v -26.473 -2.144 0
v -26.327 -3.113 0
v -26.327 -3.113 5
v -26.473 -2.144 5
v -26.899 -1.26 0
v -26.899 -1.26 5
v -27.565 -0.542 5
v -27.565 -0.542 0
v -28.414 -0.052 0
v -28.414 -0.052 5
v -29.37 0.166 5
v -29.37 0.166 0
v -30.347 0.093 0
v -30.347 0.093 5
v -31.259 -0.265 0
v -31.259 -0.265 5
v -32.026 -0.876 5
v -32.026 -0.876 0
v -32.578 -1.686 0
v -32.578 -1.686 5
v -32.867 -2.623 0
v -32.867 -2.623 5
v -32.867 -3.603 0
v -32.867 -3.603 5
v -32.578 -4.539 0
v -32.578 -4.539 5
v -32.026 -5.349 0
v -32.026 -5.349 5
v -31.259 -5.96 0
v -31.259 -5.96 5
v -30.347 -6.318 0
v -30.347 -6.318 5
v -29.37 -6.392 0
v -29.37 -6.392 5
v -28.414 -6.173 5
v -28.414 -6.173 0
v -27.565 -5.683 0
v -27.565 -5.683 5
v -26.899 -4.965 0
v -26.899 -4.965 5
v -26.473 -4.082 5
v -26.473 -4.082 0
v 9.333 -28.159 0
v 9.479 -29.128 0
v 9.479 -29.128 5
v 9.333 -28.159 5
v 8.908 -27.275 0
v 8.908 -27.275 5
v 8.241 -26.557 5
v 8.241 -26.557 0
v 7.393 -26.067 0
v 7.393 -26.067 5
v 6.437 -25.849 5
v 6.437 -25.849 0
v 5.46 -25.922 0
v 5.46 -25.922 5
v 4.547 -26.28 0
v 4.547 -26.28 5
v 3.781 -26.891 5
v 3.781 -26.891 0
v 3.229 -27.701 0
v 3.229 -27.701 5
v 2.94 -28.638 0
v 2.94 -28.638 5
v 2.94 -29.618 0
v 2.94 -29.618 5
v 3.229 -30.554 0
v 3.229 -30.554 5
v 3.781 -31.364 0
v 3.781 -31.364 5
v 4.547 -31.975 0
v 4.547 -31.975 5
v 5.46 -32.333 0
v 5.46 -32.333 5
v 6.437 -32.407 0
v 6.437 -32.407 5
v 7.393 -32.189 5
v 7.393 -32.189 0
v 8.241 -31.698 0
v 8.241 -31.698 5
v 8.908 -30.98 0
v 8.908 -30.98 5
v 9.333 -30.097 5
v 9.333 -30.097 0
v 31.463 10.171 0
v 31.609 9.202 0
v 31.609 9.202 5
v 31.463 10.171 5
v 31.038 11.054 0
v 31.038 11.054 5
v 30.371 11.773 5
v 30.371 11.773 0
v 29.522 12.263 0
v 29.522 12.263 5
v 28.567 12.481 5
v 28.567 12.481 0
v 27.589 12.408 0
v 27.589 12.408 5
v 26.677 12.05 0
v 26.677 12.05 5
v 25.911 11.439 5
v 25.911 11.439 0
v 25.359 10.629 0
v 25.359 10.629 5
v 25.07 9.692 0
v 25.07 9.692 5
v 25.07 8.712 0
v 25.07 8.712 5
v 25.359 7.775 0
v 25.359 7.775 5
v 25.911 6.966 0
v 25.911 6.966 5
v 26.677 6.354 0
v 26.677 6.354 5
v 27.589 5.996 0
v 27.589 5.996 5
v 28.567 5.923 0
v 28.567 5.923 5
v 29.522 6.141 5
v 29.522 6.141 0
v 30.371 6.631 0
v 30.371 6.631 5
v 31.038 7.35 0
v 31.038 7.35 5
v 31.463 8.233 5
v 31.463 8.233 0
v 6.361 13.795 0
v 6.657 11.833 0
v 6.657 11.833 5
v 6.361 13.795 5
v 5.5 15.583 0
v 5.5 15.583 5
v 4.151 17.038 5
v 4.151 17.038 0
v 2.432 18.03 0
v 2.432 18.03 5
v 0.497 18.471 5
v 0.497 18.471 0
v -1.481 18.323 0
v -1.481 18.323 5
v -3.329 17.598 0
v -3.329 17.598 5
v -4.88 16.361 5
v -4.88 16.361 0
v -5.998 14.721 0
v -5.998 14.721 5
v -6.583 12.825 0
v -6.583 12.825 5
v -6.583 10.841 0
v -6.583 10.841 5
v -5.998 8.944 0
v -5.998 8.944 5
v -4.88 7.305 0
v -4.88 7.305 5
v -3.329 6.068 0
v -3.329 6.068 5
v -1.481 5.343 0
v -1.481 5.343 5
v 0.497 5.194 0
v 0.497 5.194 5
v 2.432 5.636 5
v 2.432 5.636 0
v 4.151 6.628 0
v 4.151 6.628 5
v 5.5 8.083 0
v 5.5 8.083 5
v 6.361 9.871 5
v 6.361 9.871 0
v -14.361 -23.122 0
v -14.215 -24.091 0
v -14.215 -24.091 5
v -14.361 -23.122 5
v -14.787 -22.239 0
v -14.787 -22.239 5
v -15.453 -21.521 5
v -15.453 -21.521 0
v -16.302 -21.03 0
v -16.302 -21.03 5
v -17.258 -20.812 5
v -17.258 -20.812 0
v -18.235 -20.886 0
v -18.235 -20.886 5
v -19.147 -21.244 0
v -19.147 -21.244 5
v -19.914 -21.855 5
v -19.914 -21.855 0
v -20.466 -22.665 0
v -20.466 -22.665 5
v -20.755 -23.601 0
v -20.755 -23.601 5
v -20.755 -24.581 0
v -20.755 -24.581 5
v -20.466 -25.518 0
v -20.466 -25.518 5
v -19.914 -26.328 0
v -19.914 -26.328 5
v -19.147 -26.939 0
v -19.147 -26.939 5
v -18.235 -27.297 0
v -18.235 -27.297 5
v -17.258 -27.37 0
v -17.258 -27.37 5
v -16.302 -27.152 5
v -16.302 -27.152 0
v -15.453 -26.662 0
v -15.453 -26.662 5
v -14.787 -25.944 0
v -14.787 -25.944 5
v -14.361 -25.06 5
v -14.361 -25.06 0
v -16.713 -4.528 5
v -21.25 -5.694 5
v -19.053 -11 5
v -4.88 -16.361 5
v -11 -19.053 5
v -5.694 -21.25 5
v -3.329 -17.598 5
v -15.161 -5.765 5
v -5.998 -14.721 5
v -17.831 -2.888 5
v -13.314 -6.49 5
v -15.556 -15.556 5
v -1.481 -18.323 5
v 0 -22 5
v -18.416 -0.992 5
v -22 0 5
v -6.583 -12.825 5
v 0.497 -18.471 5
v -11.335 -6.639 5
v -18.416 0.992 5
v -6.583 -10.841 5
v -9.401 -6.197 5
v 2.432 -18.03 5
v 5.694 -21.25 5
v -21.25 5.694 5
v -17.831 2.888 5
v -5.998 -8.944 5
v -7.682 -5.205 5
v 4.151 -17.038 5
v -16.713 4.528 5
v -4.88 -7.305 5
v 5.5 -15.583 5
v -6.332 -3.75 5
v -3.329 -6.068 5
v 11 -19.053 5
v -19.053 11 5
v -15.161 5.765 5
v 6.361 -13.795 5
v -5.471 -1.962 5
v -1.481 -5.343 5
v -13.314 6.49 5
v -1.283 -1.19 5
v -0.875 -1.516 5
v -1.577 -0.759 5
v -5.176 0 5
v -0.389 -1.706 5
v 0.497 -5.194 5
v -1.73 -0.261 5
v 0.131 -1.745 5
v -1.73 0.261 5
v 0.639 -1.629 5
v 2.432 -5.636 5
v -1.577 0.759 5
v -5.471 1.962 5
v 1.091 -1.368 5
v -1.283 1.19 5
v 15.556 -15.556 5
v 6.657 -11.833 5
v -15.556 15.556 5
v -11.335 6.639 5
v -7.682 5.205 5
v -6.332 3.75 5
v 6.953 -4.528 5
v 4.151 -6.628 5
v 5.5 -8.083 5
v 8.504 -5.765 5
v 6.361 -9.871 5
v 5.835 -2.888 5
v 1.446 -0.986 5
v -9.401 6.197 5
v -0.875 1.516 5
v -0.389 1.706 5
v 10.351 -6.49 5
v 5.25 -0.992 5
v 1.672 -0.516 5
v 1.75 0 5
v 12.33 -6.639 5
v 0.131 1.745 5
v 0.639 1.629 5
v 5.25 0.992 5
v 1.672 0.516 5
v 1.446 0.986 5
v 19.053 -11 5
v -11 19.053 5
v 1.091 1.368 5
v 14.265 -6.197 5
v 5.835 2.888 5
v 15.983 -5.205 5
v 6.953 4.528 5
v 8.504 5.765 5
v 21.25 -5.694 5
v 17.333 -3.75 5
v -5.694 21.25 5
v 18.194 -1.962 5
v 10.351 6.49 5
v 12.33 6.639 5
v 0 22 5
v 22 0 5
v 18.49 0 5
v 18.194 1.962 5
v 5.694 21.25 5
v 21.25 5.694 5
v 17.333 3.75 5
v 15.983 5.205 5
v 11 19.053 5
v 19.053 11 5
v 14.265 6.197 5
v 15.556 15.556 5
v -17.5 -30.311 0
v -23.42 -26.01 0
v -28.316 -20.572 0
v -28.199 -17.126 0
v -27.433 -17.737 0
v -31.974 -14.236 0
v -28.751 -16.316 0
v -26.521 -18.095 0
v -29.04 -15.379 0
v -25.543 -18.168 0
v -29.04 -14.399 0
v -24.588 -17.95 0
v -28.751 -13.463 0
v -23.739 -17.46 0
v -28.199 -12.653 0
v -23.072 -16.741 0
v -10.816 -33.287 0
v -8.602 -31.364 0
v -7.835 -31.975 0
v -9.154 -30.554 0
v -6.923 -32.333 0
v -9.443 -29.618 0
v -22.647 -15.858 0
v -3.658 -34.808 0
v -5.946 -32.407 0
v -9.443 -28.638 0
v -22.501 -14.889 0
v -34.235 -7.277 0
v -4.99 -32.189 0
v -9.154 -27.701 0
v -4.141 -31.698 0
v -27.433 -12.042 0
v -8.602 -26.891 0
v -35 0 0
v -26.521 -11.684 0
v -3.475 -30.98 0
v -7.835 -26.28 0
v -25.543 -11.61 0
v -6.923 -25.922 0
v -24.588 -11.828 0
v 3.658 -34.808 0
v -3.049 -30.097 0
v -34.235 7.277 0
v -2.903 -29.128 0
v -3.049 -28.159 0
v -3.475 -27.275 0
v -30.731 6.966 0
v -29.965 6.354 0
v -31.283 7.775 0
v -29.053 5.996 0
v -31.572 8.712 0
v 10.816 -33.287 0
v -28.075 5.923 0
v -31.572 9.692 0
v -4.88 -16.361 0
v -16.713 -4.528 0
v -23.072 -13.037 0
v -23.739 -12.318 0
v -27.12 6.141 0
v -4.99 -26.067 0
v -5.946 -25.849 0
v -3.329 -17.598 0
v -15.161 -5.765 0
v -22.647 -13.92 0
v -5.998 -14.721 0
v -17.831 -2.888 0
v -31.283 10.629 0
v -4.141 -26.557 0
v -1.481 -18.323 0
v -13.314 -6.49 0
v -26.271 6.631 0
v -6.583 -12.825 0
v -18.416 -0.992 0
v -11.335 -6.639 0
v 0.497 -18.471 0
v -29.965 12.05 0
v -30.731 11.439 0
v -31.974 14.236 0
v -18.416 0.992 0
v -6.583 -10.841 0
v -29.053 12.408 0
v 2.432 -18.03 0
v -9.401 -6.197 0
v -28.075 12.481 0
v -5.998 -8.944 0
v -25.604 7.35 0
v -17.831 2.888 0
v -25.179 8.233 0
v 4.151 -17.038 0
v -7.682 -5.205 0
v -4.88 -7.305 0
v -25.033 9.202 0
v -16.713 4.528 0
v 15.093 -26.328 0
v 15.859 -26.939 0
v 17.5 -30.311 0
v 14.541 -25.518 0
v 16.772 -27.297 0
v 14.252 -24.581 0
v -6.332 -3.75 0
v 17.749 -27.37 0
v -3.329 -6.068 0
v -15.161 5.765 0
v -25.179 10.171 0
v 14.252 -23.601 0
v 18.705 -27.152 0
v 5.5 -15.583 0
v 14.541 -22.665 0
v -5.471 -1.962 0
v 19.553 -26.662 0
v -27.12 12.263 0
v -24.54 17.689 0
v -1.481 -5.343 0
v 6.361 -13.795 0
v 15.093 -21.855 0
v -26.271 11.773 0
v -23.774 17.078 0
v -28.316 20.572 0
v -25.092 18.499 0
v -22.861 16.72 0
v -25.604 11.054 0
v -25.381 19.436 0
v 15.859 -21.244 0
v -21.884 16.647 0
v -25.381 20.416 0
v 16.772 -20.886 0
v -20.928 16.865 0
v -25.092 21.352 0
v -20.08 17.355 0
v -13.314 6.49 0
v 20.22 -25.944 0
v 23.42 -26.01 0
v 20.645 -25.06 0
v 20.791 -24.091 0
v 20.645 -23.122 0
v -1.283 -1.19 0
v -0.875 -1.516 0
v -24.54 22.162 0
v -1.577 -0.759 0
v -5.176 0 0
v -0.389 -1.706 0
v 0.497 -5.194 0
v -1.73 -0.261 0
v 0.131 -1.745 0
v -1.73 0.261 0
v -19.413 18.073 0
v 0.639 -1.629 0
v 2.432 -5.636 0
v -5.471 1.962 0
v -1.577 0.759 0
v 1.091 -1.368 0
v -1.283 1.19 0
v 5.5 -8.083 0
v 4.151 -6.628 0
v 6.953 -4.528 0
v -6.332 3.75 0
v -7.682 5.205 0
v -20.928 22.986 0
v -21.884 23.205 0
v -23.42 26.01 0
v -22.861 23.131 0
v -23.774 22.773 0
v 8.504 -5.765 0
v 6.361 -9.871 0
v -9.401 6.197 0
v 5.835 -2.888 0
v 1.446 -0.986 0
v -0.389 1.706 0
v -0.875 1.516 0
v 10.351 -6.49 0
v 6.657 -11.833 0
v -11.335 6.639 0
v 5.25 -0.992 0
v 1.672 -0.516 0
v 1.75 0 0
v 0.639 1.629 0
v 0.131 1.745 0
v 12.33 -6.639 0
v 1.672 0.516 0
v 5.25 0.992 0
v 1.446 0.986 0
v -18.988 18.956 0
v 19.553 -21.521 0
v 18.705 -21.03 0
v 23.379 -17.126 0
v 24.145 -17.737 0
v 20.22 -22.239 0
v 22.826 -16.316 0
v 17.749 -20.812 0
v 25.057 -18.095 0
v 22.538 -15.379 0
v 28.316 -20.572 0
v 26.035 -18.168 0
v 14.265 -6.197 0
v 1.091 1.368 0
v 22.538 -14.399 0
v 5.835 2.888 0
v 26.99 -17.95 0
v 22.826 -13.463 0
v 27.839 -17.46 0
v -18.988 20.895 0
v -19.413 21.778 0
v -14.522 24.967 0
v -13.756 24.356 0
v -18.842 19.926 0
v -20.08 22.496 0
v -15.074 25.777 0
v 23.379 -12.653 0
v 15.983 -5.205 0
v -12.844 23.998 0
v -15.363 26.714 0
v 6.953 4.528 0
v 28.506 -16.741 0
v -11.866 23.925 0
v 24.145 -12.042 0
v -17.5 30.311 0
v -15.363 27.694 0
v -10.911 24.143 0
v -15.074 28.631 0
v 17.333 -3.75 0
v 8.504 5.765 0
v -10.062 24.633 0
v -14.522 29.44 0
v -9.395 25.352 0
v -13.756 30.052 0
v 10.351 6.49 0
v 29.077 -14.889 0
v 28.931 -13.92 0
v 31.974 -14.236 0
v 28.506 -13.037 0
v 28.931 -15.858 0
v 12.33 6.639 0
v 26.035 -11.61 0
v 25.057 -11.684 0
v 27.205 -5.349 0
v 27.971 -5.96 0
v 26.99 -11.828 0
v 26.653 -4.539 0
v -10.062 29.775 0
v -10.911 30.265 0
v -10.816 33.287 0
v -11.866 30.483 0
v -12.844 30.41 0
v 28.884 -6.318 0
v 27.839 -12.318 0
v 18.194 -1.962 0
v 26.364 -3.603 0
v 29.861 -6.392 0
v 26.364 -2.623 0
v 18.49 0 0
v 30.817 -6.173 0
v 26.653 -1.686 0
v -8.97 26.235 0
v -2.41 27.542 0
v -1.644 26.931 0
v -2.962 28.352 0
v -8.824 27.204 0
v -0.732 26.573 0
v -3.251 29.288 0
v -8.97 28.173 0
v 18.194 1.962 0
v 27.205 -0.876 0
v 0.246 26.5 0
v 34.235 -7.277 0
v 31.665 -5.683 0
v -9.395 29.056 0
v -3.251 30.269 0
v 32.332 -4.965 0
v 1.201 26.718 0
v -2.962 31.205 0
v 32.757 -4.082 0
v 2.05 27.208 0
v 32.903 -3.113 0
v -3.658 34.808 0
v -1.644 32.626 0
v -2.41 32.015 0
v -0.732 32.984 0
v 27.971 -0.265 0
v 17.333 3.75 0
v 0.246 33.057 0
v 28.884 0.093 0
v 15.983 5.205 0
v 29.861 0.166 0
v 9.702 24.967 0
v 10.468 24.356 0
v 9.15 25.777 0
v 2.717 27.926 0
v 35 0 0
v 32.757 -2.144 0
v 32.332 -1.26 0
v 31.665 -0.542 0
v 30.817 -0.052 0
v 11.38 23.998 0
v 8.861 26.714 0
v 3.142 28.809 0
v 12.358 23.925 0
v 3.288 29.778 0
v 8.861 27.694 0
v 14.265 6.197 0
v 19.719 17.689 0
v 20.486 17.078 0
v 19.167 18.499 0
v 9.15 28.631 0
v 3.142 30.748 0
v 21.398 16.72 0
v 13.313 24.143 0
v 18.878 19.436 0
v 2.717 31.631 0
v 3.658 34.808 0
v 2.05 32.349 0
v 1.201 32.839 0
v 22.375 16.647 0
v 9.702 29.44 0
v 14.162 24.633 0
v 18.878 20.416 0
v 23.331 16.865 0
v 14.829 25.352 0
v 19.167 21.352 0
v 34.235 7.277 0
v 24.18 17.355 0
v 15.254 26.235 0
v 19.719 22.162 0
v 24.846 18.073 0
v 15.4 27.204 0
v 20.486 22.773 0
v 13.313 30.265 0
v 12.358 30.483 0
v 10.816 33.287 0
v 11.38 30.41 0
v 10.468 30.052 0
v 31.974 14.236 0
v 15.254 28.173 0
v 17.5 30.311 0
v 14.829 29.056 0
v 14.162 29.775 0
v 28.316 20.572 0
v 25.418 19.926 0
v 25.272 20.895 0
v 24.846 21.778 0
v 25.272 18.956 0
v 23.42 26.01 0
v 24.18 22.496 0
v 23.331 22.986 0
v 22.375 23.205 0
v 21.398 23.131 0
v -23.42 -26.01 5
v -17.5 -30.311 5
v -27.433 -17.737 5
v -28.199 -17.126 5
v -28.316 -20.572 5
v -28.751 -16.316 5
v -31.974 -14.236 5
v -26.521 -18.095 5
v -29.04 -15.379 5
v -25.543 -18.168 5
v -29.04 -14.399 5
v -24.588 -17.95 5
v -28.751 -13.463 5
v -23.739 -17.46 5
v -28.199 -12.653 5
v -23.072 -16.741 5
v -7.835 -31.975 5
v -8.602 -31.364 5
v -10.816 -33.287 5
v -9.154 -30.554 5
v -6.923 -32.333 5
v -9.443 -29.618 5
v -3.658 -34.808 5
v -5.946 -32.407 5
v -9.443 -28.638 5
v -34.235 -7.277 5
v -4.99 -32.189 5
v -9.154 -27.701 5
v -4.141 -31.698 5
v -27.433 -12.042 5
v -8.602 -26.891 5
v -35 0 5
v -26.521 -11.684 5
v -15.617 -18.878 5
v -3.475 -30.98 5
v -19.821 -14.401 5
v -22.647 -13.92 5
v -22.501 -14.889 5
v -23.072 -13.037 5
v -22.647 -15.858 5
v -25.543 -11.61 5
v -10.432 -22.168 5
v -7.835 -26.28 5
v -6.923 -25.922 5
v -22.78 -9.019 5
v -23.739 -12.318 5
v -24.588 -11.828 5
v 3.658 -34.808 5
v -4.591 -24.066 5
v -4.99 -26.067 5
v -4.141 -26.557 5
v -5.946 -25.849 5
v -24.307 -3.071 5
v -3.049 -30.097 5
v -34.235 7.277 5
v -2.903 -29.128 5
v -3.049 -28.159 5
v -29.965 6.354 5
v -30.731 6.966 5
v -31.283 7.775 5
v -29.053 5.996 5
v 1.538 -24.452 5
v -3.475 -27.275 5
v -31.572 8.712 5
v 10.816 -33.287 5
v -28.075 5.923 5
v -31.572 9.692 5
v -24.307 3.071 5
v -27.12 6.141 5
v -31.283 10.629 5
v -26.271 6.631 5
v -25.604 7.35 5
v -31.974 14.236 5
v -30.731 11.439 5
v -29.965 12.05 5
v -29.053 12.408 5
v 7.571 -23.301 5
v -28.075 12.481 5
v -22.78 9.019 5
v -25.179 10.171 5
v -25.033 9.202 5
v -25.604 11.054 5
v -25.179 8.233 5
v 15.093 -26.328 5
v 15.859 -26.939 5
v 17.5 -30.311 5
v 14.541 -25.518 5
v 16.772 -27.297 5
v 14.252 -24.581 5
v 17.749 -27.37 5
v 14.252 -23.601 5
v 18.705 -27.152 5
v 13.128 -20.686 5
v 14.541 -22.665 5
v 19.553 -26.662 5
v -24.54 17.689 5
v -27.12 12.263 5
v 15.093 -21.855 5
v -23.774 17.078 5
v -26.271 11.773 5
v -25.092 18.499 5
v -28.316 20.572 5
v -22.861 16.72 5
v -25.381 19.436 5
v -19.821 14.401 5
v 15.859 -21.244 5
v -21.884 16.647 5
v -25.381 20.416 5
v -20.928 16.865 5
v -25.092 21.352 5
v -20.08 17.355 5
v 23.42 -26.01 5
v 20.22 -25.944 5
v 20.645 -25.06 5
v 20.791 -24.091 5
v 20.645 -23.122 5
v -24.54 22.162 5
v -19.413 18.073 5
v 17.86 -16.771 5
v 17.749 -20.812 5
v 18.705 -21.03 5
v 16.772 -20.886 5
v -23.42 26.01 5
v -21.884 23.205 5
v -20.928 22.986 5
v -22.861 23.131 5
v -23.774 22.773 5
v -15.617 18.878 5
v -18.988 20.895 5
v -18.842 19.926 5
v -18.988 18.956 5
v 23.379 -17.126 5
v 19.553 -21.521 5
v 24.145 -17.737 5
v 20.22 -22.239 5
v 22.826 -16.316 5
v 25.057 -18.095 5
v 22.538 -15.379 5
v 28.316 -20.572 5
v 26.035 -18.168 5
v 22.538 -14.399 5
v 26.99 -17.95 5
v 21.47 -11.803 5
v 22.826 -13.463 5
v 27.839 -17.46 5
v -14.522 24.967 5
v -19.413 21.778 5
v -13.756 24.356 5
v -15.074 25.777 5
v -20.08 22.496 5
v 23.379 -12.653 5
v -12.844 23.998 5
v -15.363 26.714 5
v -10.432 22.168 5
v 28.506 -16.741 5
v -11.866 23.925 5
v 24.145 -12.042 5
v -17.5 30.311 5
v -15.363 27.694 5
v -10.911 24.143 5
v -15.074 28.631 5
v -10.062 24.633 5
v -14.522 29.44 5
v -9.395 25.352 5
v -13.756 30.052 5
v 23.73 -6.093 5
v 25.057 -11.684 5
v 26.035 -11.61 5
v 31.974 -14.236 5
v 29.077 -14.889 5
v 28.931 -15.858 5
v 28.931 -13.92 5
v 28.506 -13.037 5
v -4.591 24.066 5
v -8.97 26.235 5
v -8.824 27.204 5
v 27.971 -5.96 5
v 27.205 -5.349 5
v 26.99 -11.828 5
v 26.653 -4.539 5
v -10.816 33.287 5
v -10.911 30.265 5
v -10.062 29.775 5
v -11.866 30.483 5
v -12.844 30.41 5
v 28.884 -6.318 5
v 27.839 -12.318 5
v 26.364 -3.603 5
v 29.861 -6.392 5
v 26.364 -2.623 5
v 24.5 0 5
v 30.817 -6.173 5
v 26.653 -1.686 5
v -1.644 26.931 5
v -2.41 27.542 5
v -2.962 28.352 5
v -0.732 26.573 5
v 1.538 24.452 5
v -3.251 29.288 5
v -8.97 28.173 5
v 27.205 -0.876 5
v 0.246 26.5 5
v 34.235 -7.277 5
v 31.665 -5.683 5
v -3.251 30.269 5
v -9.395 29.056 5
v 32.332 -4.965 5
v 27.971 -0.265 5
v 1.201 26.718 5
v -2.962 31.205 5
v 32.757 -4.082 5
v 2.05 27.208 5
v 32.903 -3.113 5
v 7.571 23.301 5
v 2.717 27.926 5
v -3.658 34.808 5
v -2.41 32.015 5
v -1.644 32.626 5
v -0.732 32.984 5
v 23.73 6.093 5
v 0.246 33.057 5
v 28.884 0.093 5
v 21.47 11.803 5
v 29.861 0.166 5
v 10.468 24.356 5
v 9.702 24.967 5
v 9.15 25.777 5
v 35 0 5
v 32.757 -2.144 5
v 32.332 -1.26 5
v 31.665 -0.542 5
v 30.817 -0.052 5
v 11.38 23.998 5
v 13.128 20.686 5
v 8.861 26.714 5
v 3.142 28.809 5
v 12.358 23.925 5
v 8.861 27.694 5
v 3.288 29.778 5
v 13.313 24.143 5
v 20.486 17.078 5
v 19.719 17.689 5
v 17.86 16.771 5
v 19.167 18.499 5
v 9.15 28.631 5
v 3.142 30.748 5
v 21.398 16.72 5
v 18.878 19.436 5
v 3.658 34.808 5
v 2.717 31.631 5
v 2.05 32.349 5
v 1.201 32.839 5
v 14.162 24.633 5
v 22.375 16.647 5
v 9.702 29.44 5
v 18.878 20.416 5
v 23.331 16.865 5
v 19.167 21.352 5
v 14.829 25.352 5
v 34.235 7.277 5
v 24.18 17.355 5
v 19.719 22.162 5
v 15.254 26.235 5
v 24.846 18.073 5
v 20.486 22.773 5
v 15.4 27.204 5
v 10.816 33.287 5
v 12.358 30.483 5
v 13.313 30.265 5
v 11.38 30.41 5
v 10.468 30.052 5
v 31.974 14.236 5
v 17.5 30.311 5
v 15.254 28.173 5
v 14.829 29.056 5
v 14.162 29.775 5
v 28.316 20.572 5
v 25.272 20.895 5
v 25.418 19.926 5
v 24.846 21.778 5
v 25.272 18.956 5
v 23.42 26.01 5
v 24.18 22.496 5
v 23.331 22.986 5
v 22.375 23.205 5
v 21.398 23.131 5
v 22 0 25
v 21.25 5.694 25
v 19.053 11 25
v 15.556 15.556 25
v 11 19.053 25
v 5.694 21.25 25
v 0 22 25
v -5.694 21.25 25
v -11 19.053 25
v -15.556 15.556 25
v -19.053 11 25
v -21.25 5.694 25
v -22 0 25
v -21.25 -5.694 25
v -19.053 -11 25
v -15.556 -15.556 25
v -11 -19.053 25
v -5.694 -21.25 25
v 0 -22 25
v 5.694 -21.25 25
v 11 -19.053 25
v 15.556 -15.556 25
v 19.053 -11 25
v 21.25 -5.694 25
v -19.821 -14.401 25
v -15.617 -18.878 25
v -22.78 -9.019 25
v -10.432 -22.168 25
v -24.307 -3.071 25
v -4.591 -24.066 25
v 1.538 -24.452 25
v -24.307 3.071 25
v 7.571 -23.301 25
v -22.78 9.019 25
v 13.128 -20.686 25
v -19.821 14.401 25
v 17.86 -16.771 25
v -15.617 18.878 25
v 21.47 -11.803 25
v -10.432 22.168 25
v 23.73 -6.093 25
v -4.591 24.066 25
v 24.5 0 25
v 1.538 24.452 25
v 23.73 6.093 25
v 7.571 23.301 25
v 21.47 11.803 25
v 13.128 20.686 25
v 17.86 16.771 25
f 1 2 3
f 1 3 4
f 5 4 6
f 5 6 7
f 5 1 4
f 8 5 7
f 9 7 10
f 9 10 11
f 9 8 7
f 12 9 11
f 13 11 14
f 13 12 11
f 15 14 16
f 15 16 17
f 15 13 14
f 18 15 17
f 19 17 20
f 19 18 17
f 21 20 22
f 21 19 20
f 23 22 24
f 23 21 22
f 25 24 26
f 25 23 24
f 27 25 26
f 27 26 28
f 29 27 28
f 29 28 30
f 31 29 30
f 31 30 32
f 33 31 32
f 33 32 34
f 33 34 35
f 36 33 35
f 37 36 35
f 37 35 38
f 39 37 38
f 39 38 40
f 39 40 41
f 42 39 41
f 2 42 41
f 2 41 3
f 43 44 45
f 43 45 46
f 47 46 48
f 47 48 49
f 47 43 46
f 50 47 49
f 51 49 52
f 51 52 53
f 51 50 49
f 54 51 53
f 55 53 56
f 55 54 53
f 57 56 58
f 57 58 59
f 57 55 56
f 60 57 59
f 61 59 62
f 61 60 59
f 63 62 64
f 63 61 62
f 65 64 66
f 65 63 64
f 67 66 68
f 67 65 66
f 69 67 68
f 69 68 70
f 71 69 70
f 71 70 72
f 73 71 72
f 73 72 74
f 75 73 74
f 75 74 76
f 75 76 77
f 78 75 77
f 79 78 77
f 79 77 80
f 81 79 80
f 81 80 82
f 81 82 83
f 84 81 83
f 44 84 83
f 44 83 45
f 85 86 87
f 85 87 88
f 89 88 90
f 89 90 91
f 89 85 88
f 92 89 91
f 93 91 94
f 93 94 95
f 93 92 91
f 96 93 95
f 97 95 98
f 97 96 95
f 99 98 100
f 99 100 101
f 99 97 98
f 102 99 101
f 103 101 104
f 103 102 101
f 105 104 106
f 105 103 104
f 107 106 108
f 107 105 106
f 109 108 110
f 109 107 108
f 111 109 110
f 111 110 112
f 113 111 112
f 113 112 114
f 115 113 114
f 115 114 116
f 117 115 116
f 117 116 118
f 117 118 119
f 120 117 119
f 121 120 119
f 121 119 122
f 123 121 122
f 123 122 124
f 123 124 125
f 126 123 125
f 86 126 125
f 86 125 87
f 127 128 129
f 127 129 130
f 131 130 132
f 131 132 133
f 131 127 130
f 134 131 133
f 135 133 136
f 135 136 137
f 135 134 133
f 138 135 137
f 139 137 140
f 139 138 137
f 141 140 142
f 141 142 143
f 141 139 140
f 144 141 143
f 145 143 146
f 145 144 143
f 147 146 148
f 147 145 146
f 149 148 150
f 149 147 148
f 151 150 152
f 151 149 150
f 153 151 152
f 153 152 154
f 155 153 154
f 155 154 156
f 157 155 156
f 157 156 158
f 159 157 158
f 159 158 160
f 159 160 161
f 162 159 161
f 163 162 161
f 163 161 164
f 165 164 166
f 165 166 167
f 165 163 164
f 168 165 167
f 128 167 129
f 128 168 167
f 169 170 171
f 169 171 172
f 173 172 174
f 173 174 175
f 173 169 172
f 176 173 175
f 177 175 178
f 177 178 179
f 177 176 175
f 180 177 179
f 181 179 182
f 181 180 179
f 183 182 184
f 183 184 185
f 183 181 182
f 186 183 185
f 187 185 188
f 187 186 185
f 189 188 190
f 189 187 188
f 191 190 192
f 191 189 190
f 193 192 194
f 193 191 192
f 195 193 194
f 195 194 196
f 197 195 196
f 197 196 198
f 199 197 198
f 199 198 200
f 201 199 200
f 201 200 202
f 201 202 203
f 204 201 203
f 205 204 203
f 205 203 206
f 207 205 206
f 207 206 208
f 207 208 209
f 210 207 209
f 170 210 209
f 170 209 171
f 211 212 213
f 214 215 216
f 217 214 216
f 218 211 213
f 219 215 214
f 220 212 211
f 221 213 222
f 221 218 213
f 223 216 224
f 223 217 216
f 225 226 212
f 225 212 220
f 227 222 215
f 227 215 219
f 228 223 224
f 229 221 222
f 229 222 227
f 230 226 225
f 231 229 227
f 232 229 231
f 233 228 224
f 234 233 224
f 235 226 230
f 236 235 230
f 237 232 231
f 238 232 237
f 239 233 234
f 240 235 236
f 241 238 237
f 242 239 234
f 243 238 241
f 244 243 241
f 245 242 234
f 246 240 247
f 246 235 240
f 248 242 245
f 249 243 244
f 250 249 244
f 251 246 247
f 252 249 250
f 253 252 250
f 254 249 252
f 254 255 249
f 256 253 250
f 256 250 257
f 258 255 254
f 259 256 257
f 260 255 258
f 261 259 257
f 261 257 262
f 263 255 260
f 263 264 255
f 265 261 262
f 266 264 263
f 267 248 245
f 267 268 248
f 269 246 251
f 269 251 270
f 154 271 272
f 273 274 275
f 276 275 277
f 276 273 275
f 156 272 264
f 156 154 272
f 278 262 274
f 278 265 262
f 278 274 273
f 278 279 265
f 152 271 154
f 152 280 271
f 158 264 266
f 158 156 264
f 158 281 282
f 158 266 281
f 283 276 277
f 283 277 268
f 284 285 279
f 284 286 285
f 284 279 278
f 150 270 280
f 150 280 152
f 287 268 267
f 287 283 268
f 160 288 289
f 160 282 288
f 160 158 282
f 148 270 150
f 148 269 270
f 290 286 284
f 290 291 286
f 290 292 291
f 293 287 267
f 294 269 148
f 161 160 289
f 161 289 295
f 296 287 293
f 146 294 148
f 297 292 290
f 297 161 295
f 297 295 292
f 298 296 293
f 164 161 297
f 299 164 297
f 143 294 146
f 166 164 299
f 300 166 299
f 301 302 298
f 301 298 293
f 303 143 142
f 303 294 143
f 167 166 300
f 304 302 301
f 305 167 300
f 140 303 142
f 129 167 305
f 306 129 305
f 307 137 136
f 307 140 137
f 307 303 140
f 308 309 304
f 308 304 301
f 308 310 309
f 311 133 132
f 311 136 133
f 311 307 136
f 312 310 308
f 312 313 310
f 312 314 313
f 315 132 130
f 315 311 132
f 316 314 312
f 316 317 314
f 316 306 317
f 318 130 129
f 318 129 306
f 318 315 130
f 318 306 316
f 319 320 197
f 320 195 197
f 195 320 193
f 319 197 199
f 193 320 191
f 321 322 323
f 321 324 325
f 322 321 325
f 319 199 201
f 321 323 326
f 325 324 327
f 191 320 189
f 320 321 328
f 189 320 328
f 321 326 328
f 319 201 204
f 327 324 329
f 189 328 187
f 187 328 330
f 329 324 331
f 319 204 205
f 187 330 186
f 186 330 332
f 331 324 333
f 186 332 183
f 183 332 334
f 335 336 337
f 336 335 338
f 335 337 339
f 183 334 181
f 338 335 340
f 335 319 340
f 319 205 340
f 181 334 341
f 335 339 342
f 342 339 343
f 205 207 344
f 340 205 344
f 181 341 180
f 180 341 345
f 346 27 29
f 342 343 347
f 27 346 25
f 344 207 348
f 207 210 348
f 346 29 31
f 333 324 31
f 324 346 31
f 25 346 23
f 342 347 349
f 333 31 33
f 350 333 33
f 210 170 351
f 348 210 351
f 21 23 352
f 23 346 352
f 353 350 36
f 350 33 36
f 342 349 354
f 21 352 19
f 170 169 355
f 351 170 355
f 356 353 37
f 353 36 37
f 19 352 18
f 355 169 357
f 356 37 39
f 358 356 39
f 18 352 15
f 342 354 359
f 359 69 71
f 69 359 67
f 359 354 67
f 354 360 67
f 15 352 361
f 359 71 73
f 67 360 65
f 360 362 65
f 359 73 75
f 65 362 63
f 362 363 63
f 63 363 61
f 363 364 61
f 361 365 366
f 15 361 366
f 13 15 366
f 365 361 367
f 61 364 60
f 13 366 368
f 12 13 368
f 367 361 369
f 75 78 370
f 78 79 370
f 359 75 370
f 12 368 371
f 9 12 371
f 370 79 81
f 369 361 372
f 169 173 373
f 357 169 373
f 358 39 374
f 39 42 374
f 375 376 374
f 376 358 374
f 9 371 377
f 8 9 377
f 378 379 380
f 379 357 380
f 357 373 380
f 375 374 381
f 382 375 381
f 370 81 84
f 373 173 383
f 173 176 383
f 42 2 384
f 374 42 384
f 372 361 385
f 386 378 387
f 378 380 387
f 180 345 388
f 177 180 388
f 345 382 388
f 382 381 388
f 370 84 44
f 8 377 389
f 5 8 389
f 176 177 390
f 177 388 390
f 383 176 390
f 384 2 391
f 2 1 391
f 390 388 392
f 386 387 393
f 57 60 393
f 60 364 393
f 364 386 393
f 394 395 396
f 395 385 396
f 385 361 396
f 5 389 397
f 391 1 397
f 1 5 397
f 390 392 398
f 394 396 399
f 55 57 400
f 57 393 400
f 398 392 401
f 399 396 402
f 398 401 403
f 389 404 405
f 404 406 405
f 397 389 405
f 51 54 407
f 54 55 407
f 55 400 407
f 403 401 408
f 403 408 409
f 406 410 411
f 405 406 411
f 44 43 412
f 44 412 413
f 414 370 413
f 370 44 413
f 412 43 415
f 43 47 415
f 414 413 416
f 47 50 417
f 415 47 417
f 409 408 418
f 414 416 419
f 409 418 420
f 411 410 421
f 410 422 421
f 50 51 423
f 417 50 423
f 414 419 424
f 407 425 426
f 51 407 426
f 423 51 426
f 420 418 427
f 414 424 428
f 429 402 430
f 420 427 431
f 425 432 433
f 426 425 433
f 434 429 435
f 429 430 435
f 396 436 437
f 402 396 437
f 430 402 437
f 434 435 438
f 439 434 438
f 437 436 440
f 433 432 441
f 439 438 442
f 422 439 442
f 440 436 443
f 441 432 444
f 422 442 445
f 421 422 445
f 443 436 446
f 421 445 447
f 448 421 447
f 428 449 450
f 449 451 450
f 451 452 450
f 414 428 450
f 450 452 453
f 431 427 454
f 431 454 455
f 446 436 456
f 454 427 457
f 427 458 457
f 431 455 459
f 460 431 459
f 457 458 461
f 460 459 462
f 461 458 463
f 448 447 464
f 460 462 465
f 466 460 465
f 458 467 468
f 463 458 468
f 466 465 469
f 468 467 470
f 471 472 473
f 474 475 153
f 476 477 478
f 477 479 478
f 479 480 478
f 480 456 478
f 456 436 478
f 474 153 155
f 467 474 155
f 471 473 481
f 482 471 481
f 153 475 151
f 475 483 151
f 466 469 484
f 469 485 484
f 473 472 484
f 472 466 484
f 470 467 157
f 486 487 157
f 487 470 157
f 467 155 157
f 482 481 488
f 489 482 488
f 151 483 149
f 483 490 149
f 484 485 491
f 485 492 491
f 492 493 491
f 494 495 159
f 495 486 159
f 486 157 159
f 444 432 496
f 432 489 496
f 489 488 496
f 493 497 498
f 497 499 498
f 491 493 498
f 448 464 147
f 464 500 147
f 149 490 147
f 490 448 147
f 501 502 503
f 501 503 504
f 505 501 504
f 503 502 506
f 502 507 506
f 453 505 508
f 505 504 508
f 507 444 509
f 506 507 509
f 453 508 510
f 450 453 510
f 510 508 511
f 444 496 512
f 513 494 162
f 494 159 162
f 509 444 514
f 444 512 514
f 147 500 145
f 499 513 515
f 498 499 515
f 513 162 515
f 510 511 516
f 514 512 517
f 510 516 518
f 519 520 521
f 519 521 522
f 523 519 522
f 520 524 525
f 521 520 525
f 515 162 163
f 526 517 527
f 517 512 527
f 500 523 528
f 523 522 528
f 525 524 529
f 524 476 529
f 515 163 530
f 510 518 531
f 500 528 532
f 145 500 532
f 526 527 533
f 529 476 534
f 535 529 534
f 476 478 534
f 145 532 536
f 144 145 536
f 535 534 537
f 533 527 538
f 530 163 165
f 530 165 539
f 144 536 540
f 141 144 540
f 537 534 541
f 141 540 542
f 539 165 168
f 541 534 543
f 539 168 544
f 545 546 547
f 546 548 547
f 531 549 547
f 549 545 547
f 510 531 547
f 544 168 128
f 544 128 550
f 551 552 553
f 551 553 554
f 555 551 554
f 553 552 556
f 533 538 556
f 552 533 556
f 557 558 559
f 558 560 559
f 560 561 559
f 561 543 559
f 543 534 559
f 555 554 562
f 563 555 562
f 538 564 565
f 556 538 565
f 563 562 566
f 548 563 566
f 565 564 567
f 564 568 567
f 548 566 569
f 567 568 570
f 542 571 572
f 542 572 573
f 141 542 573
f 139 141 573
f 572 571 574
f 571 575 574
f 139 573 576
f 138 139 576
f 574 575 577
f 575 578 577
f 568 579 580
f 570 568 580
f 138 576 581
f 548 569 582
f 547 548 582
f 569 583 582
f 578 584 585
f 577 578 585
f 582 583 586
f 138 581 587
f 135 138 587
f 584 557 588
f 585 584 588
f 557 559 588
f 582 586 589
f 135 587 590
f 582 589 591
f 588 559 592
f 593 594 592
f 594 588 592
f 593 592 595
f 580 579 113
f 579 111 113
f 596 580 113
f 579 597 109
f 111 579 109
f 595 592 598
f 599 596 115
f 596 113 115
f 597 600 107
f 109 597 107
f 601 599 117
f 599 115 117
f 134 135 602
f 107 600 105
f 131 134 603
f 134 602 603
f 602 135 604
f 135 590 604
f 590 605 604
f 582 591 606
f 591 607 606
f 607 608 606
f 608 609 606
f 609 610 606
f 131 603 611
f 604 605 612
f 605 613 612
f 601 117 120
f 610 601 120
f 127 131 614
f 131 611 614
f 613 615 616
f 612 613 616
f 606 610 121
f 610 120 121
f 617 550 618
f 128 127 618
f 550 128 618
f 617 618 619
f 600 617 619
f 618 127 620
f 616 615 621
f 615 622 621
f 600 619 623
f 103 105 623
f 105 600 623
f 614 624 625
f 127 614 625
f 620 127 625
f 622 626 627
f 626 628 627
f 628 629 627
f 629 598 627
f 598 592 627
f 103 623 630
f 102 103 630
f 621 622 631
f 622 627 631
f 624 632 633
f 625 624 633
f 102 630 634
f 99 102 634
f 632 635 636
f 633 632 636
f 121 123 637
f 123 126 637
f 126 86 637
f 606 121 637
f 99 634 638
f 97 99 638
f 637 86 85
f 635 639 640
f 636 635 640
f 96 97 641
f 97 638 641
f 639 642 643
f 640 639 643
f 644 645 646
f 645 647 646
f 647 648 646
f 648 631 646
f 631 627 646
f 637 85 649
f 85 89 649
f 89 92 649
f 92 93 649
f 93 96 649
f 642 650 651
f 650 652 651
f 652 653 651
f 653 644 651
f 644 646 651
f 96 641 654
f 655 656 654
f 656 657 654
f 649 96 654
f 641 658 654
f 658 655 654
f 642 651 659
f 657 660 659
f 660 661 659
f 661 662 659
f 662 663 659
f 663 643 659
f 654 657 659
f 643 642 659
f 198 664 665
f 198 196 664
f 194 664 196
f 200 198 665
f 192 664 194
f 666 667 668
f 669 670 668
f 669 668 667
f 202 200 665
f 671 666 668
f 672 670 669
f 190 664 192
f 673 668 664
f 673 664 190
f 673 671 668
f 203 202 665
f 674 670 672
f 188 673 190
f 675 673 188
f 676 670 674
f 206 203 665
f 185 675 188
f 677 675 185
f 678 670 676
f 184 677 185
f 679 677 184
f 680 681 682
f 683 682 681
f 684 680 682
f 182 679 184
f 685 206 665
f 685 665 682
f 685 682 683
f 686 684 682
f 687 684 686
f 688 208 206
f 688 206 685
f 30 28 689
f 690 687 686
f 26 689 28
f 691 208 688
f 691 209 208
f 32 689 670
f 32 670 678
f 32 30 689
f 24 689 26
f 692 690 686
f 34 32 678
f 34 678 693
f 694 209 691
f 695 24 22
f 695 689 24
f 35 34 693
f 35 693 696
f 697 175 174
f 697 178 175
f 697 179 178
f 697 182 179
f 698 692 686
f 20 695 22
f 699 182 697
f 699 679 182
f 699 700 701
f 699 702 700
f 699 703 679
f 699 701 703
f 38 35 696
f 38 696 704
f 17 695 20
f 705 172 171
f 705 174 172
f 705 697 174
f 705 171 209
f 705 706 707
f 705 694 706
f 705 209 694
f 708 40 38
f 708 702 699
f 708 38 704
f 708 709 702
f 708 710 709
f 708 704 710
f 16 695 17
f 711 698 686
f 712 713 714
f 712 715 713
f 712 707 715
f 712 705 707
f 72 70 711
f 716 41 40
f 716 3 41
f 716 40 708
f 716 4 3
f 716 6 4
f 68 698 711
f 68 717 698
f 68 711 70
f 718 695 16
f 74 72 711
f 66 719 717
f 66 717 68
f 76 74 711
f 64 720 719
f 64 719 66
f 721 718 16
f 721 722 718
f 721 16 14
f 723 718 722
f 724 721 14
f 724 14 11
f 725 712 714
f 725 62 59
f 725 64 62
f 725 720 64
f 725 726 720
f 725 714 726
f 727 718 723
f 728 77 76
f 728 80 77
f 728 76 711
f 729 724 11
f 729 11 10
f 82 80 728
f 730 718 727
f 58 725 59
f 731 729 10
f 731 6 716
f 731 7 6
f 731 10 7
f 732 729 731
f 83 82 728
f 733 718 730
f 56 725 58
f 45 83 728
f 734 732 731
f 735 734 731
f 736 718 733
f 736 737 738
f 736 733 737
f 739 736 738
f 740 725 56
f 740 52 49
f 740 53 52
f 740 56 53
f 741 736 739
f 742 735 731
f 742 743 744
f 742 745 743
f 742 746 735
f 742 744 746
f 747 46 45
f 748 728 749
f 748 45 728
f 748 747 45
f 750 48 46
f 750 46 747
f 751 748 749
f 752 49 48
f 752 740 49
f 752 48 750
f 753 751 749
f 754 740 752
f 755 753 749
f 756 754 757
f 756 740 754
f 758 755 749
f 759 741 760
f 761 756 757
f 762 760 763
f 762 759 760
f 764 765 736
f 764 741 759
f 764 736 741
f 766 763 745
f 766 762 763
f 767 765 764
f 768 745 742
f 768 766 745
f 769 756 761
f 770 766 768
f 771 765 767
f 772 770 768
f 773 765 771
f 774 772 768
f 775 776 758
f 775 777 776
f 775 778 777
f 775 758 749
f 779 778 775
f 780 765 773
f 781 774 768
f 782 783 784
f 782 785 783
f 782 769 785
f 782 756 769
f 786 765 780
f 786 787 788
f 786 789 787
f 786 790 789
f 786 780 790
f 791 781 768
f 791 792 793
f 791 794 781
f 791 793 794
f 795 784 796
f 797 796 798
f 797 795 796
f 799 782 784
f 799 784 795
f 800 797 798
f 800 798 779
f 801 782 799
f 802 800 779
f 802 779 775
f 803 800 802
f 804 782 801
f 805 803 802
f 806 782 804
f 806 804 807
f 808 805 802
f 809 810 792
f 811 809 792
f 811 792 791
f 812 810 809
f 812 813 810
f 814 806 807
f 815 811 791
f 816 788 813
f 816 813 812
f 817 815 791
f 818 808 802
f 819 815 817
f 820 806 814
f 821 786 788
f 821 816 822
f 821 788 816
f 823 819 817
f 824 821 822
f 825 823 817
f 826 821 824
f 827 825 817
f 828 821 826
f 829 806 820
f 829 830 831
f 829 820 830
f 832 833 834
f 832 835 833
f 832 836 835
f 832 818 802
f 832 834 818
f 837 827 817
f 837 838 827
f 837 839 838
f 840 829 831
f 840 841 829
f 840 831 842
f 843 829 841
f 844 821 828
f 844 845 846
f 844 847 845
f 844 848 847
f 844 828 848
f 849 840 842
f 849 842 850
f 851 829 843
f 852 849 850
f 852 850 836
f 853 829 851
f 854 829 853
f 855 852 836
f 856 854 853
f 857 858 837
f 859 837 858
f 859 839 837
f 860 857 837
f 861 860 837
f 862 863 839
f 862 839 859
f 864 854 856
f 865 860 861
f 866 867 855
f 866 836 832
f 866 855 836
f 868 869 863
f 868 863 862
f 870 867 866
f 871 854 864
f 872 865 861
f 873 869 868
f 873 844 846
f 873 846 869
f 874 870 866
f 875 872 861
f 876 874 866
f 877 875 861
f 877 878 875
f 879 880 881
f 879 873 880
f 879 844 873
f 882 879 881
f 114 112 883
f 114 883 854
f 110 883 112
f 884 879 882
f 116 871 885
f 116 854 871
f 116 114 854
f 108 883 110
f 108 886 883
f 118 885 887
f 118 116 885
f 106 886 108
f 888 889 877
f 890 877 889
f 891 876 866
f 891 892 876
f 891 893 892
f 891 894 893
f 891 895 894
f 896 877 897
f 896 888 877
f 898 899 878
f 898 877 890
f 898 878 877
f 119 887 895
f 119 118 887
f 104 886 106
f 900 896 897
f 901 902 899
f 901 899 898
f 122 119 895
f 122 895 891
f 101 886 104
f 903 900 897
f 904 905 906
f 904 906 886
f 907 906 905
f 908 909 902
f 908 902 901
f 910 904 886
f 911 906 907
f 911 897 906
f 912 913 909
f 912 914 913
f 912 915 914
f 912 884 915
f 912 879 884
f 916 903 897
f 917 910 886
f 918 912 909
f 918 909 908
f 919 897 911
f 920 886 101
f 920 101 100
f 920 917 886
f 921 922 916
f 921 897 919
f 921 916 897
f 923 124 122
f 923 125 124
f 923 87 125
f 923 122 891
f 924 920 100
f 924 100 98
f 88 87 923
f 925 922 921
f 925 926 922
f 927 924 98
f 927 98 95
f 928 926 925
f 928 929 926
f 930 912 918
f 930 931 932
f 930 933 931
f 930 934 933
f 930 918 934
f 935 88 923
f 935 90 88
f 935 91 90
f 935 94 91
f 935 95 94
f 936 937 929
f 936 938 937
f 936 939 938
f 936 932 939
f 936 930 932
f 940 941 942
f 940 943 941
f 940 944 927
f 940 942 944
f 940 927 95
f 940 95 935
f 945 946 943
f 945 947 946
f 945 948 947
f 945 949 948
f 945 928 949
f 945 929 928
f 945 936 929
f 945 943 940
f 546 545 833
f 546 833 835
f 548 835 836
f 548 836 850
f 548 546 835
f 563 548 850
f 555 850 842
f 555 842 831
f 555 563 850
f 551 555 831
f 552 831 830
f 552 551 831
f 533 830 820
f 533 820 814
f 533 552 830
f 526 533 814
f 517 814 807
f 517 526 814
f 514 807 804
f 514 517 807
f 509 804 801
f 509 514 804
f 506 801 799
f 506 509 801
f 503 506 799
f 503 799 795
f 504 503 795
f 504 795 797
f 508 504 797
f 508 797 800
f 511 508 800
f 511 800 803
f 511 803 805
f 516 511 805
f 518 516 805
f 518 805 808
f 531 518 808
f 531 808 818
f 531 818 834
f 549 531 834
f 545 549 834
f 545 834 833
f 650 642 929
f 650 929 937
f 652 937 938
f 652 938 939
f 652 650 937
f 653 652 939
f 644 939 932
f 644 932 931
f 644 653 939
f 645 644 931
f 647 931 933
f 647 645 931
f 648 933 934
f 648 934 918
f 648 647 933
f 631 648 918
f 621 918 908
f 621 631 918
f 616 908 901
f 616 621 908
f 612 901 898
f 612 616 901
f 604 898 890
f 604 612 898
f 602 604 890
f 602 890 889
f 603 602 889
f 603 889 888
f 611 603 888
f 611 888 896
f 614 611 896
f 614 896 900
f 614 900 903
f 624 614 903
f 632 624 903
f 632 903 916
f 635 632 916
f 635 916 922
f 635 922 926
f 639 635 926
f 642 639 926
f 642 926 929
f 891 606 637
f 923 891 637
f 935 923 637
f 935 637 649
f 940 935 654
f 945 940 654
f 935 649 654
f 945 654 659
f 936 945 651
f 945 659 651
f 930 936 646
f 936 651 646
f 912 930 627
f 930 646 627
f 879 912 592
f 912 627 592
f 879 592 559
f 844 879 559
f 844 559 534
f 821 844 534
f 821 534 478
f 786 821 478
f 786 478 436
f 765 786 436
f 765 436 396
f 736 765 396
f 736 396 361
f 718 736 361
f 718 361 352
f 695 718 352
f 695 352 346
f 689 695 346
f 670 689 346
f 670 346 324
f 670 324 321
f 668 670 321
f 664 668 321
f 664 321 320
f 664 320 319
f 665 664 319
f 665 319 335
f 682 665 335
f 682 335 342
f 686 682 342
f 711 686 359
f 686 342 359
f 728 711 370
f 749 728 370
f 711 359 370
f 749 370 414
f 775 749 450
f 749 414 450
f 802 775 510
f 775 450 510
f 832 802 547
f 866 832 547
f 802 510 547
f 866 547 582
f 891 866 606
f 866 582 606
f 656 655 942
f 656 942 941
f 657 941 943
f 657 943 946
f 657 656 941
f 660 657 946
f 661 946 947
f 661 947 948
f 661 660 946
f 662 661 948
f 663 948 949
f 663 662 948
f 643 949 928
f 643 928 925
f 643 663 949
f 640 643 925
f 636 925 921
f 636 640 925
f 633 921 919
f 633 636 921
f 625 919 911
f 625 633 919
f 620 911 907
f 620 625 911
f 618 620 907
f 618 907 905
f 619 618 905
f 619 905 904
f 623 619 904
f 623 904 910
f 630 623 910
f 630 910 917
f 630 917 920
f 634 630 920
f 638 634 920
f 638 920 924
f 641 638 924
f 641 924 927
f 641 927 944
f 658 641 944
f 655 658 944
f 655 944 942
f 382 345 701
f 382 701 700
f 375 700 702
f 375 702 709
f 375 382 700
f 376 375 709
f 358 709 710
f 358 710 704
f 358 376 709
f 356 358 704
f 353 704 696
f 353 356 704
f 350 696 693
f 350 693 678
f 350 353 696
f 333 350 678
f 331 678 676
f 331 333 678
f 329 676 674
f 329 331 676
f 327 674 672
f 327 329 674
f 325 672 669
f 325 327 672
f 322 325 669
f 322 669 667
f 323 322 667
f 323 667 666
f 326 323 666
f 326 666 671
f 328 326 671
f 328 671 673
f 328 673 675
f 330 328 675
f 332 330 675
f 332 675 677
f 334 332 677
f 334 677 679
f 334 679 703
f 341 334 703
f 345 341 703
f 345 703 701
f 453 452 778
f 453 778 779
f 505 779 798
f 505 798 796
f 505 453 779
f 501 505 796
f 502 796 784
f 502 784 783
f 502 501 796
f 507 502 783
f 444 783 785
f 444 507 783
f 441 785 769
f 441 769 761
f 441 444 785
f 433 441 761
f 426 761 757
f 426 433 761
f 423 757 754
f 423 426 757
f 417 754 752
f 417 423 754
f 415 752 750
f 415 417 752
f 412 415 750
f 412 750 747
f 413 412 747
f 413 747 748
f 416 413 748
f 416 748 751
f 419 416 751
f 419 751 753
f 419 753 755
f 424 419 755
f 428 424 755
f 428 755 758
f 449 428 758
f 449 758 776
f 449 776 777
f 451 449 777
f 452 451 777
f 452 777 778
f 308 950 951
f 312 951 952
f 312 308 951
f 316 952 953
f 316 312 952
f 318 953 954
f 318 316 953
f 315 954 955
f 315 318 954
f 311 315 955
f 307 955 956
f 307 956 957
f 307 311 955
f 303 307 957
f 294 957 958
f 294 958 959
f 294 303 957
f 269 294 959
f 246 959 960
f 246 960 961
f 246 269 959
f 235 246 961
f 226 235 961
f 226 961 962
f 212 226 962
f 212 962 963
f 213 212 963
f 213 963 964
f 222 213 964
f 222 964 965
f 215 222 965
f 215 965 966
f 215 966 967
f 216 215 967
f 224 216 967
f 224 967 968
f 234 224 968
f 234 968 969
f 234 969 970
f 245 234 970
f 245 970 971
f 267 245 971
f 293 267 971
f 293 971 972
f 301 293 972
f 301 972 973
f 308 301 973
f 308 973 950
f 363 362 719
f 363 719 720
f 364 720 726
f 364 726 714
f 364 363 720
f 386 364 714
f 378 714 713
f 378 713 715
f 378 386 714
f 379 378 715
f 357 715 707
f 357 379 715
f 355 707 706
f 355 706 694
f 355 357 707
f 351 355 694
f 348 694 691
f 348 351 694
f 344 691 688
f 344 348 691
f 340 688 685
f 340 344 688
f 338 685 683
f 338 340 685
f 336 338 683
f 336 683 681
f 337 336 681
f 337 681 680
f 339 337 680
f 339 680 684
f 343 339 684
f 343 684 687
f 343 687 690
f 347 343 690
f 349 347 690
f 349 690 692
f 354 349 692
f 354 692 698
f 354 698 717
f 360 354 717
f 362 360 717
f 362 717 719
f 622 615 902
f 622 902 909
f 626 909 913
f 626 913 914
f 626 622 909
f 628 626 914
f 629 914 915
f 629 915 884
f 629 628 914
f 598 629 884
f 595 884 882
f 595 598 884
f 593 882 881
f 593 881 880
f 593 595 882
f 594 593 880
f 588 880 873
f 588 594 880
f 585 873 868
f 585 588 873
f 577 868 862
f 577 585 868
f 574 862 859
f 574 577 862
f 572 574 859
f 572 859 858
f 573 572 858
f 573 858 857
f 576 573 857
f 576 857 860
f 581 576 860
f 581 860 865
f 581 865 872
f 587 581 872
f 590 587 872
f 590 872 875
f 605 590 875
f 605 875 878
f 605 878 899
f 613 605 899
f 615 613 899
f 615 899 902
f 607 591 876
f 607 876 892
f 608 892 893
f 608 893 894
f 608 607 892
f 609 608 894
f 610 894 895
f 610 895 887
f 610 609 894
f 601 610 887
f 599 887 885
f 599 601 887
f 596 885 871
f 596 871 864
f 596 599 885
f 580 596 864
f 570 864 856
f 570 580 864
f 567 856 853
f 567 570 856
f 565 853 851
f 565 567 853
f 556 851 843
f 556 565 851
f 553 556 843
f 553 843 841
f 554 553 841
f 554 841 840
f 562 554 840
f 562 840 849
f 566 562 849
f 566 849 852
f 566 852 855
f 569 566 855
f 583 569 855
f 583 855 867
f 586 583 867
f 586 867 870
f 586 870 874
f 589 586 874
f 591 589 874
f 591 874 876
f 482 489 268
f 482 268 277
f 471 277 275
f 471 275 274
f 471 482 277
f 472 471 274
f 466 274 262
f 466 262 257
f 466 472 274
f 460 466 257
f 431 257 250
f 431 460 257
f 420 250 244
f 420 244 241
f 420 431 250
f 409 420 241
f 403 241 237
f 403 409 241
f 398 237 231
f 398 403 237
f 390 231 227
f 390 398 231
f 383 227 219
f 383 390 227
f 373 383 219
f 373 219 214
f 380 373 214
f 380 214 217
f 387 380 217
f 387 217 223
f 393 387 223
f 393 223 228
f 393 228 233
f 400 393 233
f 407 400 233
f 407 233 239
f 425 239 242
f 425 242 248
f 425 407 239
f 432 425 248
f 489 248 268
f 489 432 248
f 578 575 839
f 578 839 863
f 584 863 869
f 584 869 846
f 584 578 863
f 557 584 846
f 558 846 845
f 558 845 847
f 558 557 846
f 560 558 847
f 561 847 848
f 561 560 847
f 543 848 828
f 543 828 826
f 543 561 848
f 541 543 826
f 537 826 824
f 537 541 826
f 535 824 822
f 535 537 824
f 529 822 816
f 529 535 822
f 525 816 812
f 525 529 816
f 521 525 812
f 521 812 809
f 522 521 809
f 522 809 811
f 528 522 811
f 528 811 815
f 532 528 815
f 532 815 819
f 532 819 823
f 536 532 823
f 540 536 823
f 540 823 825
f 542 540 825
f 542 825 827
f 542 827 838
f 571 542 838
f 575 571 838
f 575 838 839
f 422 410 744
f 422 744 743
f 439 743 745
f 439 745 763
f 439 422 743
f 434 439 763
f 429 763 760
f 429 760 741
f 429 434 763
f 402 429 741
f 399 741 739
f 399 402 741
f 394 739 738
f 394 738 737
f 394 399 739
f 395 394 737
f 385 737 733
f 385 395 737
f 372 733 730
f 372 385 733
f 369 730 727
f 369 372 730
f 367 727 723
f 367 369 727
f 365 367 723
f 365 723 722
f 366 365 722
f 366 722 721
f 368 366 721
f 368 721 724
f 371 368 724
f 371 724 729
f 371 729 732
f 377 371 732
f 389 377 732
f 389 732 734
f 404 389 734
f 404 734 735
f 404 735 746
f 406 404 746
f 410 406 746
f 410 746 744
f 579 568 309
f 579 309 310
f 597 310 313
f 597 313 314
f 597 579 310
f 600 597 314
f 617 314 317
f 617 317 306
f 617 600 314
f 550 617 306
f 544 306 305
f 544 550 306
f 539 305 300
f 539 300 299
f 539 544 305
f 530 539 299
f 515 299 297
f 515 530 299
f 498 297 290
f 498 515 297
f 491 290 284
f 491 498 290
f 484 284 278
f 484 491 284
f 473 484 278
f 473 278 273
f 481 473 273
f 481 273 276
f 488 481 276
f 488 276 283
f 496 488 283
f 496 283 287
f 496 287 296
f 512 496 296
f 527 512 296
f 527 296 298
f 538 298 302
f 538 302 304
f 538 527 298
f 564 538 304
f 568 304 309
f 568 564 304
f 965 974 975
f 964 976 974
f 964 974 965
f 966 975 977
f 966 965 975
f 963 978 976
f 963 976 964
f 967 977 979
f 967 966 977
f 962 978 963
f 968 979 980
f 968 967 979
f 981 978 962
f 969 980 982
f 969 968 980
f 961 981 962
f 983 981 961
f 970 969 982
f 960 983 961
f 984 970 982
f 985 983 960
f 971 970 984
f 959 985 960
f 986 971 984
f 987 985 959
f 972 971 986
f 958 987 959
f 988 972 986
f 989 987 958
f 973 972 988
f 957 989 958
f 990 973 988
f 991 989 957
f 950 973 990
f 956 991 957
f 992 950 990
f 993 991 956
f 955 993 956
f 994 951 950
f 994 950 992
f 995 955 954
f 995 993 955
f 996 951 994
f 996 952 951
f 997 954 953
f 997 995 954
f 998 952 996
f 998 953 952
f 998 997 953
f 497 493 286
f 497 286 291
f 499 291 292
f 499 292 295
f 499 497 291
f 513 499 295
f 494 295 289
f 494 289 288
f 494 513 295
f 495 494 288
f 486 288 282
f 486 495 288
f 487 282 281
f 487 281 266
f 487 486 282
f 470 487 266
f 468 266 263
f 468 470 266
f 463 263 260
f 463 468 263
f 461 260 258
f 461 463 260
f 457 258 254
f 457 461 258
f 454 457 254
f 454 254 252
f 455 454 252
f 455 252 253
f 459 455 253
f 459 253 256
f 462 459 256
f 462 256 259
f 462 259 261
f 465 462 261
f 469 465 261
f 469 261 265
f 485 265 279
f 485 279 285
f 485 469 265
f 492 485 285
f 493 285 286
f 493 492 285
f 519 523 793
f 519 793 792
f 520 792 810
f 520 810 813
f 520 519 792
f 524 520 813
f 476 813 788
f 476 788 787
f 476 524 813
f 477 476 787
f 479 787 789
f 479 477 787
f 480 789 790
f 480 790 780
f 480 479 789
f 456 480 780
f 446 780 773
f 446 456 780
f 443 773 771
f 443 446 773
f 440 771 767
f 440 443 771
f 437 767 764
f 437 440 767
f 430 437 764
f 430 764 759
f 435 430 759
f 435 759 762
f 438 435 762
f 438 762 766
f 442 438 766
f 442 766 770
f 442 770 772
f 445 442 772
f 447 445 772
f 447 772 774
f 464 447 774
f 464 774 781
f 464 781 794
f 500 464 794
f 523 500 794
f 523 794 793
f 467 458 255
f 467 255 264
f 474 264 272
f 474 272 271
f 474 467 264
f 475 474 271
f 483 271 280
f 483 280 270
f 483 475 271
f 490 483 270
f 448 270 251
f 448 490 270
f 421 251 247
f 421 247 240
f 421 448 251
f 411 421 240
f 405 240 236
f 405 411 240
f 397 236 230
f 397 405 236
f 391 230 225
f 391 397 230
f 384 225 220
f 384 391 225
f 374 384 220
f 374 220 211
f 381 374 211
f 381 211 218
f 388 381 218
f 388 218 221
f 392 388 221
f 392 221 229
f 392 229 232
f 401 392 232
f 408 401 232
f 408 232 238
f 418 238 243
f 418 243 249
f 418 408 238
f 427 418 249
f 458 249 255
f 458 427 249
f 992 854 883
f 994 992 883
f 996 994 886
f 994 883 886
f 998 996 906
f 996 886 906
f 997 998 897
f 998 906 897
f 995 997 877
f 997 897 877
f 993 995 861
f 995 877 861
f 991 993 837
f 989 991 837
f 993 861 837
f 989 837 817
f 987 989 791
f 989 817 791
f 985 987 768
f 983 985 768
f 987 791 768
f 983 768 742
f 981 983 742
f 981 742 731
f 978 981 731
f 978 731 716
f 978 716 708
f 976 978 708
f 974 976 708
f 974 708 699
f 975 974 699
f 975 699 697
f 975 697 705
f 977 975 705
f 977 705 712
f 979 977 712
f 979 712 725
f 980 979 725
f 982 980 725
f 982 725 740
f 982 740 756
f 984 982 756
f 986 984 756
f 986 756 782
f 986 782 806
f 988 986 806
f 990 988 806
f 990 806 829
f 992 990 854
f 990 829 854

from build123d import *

# Parameters (mm, degrees)
F0_R     = 35
F0_R_2   = 3.2880949383
F0_R_3   = 24.5
F0_R_4   = 22
F0_R_5   = 6.6571375288
F0_R_6   = 1.75
F1_DEPTH = 5
F2_DEPTH = 25
F3_DEPTH = 3


with BuildPart() as f1:
    # F0 (on Top) → F1 (new body)
    with BuildSketch(Plane.XY):
        Circle(F0_R)
        with Locations((-17.5033363634, -24.0912757185)):
            Circle(F0_R_2, mode=Mode.SUBTRACT)
        with Locations((-6.1912888152, -29.1277237765)):
            Circle(F0_R_2, mode=Mode.SUBTRACT)
        with Locations((-25.7888980415, -14.8892272264)):
            Circle(F0_R_2, mode=Mode.SUBTRACT)
        with Locations((-29.6153249635, -3.1126960824)):
            Circle(F0_R_2, mode=Mode.SUBTRACT)
        with Locations((6.1912888152, -29.1277237765)):
            Circle(F0_R_2, mode=Mode.SUBTRACT)
        with Locations((17.5033363634, -24.0912757185)):
            Circle(F0_R_2, mode=Mode.SUBTRACT)
        with Locations((25.7888980415, -14.8892272264)):
            Circle(F0_R_2, mode=Mode.SUBTRACT)
        with Locations((29.6153249635, -3.1126960824)):
            Circle(F0_R_2, mode=Mode.SUBTRACT)
        with Locations((-28.3209931525, 9.2020484921)):
            Circle(F0_R_2, mode=Mode.SUBTRACT)
        with Locations((-22.1297043373, 19.9256752844)):
            Circle(F0_R_2, mode=Mode.SUBTRACT)
        with Locations((-12.1119886001, 27.2039718009)):
            Circle(F0_R_2, mode=Mode.SUBTRACT)
        Circle(F0_R_3, mode=Mode.SUBTRACT)
        with Locations((28.3209931525, 9.2020484921)):
            Circle(F0_R_2, mode=Mode.SUBTRACT)
        with Locations((0, 29.7784544528)):
            Circle(F0_R_2, mode=Mode.SUBTRACT)
        with Locations((12.1119886001, 27.2039718009)):
            Circle(F0_R_2, mode=Mode.SUBTRACT)
        with Locations((22.1297043373, 19.9256752844)):
            Circle(F0_R_2, mode=Mode.SUBTRACT)
        Circle(F0_R_3)
        Circle(F0_R_4, mode=Mode.SUBTRACT)
        Circle(F0_R_4)
        with Locations((0, -11.8328090757)):
            Circle(F0_R_5, mode=Mode.SUBTRACT)
        with Locations((-11.8328090757, 0)):
            Circle(F0_R_5, mode=Mode.SUBTRACT)
        Circle(F0_R_6, mode=Mode.SUBTRACT)
        with Locations((11.8328090757, 0)):
            Circle(F0_R_5, mode=Mode.SUBTRACT)
        with Locations((0, 11.8328090757)):
            Circle(F0_R_5, mode=Mode.SUBTRACT)
    extrude(amount=F1_DEPTH)

    # F0 (on Top) → F2 (join)
    with BuildSketch(Plane.XY):
        Circle(F0_R_3)
        Circle(F0_R_4, mode=Mode.SUBTRACT)
    extrude(amount=F2_DEPTH)

    # F0 (on Top) → F3 (join)
    with BuildSketch(Plane.XY):
        Circle(F0_R)
        with Locations((-17.5033363634, -24.0912757185)):
            Circle(F0_R_2, mode=Mode.SUBTRACT)
        with Locations((-6.1912888152, -29.1277237765)):
            Circle(F0_R_2, mode=Mode.SUBTRACT)
        with Locations((-25.7888980415, -14.8892272264)):
            Circle(F0_R_2, mode=Mode.SUBTRACT)
        with Locations((-29.6153249635, -3.1126960824)):
            Circle(F0_R_2, mode=Mode.SUBTRACT)
        with Locations((6.1912888152, -29.1277237765)):
            Circle(F0_R_2, mode=Mode.SUBTRACT)
        with Locations((17.5033363634, -24.0912757185)):
            Circle(F0_R_2, mode=Mode.SUBTRACT)
        with Locations((25.7888980415, -14.8892272264)):
            Circle(F0_R_2, mode=Mode.SUBTRACT)
        with Locations((29.6153249635, -3.1126960824)):
            Circle(F0_R_2, mode=Mode.SUBTRACT)
        with Locations((-28.3209931525, 9.2020484921)):
            Circle(F0_R_2, mode=Mode.SUBTRACT)
        with Locations((-22.1297043373, 19.9256752844)):
            Circle(F0_R_2, mode=Mode.SUBTRACT)
        with Locations((-12.1119886001, 27.2039718009)):
            Circle(F0_R_2, mode=Mode.SUBTRACT)
        Circle(F0_R_3, mode=Mode.SUBTRACT)
        with Locations((28.3209931525, 9.2020484921)):
            Circle(F0_R_2, mode=Mode.SUBTRACT)
        with Locations((0, 29.7784544528)):
            Circle(F0_R_2, mode=Mode.SUBTRACT)
        with Locations((12.1119886001, 27.2039718009)):
            Circle(F0_R_2, mode=Mode.SUBTRACT)
        with Locations((22.1297043373, 19.9256752844)):
            Circle(F0_R_2, mode=Mode.SUBTRACT)
    extrude(amount=F3_DEPTH)


solid = f1.part
